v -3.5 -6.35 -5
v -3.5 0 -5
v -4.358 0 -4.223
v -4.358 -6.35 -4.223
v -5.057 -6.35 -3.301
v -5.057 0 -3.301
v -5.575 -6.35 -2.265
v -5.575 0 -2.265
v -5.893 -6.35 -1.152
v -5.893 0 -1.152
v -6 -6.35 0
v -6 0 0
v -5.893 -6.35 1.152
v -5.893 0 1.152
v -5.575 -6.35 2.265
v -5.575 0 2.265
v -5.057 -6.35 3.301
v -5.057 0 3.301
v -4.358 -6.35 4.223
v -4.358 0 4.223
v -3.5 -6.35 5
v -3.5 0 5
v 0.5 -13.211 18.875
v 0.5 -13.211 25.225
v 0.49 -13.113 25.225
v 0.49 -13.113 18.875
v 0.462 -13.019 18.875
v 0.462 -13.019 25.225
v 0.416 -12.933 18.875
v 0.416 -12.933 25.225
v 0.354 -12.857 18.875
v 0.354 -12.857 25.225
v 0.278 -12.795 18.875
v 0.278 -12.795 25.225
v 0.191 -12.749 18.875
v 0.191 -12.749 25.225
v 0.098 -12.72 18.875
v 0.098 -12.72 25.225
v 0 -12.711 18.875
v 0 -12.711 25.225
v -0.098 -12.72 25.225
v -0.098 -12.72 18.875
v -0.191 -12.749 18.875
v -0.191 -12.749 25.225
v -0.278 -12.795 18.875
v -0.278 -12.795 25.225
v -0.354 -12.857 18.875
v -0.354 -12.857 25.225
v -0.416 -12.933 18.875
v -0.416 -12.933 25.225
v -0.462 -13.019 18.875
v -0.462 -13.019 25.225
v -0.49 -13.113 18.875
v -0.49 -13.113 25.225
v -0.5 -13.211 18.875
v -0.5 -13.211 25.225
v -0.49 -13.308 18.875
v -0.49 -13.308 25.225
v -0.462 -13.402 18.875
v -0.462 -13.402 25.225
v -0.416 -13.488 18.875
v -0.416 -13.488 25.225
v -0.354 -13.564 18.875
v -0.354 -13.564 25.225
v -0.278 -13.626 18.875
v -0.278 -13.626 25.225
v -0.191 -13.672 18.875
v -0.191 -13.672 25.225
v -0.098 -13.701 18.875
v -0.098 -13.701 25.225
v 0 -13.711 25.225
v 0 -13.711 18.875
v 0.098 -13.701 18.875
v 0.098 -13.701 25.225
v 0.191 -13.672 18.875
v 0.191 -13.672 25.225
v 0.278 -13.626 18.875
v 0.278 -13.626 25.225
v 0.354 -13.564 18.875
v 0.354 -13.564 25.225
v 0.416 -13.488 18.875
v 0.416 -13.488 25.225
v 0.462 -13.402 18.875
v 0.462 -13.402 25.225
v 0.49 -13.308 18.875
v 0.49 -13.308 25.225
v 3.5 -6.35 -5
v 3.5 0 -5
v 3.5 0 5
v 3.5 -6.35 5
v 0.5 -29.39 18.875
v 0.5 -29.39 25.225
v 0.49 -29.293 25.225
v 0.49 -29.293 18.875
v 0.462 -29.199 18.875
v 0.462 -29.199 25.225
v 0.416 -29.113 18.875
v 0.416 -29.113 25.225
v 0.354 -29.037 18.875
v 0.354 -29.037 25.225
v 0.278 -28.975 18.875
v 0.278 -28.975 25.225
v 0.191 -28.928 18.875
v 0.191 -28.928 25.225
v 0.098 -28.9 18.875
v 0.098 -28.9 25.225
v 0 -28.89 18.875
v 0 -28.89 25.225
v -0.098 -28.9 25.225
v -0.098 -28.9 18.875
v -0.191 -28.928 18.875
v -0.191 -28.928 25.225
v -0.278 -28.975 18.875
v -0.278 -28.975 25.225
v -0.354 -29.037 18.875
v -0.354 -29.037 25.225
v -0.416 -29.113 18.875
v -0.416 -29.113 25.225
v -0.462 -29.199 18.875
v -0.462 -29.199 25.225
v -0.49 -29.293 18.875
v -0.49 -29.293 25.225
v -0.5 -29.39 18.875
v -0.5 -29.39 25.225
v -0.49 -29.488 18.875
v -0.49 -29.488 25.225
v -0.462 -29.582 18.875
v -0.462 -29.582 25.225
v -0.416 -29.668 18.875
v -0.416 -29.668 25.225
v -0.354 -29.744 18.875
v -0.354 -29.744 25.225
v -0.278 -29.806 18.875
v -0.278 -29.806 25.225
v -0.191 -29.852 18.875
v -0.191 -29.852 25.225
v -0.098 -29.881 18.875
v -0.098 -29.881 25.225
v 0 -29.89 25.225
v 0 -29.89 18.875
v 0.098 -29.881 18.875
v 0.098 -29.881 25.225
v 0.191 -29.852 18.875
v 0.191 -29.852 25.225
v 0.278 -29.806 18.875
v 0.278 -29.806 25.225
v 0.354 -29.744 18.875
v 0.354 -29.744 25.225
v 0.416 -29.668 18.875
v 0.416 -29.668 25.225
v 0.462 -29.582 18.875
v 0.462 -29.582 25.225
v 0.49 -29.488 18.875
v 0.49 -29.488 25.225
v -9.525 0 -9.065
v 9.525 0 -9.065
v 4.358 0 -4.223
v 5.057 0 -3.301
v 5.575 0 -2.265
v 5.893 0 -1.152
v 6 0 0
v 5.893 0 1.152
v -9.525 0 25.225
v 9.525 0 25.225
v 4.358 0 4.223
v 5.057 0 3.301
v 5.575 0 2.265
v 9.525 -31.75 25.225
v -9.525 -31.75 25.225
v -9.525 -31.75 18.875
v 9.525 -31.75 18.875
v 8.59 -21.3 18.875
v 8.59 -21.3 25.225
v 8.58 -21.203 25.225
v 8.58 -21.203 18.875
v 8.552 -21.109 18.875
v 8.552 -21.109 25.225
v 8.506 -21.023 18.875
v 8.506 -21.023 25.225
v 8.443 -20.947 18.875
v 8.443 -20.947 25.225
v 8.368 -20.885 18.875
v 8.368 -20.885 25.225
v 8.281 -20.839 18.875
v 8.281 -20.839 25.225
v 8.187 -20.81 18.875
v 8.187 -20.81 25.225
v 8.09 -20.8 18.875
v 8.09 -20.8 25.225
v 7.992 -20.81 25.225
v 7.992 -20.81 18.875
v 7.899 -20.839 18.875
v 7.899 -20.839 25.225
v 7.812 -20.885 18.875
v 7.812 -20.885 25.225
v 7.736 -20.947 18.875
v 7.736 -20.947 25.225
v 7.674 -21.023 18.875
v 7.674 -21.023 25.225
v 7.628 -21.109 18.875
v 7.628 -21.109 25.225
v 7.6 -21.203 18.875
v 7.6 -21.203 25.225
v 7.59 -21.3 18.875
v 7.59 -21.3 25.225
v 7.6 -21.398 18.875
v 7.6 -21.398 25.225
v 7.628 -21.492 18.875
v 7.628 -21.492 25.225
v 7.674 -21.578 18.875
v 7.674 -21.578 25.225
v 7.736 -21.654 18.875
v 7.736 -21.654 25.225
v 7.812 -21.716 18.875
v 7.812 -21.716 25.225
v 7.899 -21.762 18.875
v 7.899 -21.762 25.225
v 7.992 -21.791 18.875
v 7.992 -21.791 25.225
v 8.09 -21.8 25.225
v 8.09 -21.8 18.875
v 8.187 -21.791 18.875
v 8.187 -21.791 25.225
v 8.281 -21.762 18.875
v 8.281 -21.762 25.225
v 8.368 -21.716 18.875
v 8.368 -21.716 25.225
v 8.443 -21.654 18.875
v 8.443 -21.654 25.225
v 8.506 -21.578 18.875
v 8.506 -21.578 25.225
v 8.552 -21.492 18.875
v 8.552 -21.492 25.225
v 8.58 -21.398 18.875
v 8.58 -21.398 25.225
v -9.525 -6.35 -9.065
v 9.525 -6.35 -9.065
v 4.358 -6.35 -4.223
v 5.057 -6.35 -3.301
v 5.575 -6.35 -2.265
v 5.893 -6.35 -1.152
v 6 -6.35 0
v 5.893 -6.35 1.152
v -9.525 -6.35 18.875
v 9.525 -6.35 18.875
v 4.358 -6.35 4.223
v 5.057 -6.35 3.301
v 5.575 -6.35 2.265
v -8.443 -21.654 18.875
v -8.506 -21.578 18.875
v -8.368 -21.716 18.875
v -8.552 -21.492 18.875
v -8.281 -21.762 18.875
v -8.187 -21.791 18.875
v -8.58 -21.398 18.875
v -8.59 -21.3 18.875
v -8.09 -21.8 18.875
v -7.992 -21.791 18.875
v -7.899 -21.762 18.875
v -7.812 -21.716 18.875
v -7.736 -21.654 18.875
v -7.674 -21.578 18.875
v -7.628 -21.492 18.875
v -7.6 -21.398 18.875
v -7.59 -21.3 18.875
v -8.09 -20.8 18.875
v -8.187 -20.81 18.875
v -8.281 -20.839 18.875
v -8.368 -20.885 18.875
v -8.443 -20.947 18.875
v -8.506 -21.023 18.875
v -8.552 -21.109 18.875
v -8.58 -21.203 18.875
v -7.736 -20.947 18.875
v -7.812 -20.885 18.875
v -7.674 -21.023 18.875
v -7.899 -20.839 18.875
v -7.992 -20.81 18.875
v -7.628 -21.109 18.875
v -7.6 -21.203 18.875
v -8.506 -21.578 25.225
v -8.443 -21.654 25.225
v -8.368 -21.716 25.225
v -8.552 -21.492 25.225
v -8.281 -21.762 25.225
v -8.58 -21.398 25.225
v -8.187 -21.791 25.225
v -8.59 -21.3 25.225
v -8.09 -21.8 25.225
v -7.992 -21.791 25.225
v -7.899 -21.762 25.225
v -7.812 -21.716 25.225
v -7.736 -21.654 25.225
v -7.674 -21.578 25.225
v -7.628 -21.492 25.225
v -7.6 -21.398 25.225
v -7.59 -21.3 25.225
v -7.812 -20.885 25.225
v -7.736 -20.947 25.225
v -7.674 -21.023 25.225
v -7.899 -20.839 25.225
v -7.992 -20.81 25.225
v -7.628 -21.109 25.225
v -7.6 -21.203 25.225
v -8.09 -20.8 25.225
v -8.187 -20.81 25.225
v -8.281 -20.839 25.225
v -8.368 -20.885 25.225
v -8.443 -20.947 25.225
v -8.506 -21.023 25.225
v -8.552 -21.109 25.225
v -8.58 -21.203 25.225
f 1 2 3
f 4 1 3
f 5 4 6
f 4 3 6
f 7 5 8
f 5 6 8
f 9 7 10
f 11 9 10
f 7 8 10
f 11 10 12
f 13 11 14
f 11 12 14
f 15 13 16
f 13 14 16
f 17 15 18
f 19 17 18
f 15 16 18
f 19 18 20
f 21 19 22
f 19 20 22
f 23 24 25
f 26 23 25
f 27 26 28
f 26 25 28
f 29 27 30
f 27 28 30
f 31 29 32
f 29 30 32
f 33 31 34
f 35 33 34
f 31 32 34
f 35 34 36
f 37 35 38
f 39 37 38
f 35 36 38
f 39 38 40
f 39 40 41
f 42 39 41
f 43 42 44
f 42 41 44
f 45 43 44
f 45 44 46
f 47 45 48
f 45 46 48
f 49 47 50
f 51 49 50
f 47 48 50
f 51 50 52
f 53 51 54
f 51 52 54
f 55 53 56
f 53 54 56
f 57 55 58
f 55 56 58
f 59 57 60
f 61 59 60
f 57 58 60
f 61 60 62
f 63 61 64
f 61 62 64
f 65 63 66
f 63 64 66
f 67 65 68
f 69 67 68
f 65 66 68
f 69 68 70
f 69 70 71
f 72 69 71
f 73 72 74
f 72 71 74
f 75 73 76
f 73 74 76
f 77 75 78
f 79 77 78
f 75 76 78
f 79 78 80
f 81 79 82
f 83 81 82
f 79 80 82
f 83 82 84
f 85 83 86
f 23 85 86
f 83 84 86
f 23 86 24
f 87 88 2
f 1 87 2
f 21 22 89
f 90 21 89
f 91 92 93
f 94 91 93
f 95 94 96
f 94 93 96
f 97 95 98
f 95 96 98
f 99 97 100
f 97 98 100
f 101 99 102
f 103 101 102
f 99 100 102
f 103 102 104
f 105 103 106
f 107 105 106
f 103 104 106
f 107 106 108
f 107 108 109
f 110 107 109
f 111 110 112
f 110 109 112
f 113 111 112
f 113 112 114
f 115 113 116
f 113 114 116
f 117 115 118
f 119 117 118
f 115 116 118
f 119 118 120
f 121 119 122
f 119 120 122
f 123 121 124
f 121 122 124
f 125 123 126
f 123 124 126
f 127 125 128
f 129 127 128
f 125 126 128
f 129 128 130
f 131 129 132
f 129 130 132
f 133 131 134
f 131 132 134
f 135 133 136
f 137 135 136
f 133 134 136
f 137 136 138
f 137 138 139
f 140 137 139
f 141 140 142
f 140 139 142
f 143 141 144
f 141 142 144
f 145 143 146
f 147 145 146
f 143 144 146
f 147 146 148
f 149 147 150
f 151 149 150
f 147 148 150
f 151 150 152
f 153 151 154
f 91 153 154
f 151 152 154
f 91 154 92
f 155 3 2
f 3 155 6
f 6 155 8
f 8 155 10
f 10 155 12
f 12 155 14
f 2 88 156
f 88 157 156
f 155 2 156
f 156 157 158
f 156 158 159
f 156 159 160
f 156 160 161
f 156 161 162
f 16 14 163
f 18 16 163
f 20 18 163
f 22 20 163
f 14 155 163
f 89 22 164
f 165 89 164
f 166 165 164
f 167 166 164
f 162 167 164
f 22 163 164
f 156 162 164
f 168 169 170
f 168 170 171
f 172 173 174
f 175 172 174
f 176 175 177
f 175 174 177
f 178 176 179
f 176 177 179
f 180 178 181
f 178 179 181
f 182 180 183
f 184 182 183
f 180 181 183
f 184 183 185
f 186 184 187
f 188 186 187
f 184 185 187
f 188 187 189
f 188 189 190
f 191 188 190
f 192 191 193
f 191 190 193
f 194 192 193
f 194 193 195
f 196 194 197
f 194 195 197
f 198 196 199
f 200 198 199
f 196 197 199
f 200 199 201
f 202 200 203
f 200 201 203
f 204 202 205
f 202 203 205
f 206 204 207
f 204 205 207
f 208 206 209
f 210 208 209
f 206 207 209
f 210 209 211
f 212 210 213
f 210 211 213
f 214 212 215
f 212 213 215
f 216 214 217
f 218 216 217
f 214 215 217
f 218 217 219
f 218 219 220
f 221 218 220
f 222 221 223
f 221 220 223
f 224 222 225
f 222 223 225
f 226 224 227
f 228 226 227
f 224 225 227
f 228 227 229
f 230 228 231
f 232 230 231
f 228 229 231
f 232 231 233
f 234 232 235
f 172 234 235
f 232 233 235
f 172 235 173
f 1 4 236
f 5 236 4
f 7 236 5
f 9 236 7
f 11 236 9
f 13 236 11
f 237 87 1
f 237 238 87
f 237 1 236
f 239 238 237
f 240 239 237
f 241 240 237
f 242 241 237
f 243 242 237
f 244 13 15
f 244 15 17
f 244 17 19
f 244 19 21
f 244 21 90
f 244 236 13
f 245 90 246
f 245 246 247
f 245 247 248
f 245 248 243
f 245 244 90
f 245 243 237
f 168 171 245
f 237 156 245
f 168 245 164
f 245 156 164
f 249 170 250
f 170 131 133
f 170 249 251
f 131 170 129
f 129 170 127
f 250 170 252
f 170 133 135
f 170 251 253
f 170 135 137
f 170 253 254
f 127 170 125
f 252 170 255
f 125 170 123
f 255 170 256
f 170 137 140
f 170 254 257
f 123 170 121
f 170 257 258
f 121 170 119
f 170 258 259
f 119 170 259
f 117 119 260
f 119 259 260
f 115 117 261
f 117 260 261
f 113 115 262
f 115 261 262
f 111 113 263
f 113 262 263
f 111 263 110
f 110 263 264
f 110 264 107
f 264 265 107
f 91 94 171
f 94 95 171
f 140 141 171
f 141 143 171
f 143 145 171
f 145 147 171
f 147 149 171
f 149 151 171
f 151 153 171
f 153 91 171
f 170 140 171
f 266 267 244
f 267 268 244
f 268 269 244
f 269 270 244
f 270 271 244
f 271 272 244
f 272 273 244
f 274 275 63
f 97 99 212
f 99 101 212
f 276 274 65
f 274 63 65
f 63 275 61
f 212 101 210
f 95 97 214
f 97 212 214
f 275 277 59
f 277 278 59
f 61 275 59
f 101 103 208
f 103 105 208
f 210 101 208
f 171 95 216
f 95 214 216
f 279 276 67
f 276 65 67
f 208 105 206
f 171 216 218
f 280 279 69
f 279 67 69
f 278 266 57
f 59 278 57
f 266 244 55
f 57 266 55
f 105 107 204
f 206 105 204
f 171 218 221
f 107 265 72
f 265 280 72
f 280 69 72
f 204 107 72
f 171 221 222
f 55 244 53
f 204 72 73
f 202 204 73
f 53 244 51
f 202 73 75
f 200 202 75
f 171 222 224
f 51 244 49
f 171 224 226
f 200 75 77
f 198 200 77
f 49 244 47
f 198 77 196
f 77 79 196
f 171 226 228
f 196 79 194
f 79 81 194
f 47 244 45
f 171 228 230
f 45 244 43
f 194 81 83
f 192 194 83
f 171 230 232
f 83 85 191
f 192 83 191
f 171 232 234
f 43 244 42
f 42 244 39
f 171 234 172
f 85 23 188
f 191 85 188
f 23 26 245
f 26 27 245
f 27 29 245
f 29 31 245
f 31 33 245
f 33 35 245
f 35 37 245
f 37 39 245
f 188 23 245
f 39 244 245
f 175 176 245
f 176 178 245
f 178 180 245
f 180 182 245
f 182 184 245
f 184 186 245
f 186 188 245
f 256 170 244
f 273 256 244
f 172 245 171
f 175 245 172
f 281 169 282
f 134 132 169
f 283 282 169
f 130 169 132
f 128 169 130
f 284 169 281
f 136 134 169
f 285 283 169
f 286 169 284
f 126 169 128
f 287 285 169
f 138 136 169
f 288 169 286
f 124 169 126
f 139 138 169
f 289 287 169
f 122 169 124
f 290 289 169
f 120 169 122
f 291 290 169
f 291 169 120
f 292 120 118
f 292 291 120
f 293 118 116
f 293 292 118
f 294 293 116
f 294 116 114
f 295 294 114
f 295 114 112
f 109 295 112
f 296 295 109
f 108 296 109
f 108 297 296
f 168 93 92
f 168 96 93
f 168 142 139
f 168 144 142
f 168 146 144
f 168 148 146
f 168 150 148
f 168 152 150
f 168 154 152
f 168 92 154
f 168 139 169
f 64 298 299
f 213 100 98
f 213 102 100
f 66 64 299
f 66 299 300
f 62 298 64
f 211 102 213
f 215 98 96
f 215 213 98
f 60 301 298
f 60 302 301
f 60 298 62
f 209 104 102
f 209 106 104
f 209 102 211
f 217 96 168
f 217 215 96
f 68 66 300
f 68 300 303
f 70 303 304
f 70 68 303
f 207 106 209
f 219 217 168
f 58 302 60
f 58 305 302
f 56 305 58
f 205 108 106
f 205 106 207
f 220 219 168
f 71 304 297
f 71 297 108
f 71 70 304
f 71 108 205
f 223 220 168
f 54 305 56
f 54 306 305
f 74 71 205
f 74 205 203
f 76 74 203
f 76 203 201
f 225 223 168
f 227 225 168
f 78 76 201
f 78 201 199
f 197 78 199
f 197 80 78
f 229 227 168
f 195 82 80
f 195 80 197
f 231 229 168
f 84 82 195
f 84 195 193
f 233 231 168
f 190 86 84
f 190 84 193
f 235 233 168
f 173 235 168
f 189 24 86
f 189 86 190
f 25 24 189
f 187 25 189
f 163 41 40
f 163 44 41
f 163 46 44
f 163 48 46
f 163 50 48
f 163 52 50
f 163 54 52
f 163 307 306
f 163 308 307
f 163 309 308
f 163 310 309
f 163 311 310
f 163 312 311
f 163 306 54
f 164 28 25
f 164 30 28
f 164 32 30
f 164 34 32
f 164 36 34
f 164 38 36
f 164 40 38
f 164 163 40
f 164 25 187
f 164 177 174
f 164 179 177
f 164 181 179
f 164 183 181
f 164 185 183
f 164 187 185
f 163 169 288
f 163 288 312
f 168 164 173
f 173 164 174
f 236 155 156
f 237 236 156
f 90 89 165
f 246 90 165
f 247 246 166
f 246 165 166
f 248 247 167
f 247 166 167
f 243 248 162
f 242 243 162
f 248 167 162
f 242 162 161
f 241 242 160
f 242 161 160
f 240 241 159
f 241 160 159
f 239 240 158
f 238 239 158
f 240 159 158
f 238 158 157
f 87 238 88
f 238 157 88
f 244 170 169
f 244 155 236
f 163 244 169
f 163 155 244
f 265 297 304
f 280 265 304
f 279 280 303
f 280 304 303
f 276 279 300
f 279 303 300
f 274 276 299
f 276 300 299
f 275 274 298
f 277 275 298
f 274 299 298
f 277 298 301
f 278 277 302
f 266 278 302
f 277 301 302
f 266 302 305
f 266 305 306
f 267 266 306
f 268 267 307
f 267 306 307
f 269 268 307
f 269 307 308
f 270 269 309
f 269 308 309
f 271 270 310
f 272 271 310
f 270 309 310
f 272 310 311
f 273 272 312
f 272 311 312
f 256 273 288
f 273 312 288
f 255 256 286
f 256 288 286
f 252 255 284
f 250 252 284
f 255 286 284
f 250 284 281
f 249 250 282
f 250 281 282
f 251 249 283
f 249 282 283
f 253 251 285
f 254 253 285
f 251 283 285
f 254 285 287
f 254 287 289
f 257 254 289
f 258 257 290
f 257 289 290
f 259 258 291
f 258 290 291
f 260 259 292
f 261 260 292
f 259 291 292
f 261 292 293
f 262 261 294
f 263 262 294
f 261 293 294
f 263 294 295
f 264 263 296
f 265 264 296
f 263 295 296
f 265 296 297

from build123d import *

# Parameters (mm, degrees)
F0_W     = 19.05
F0_H     = 34.29
F1_DEPTH = 6.35
F2_W     = 19.05
F2_H     = 6.35
F3_DEPTH = 25.4
F4_R     = 0.5
F5_DEPTH = 6.35


with BuildPart() as f1:
    # F0 (on Front) → F1 (new body)
    with BuildSketch(Plane.XZ):
        with Locations((0, 8.08)):
            Rectangle(F0_W, F0_H)
        with BuildLine():
            ThreePointArc((-3.5, -5), (-6, 0), (-3.5, 5))
            Line((-3.5, 5), (3.5, 5))
            ThreePointArc((3.5, 5), (6, 0), (3.5, -5))
            Line((3.5, -5), (-3.5, -5))
        make_face(mode=Mode.SUBTRACT)
    extrude(amount=F1_DEPTH)

    # F2 (on face) → F3 (join)
    with BuildSketch(Plane.XZ.offset(6.35)):
        with Locations((0, 22.05)):
            Rectangle(F2_W, F2_H)
    extrude(amount=F3_DEPTH)

    # F4 (on face) → F5 (cut, through all)
    with BuildSketch(Plane.XY.offset(25.225)):
        with Locations((-8.0899, -21.30044)):
            Circle(F4_R)
        with Locations((0, -29.39034)):
            Circle(F4_R)
        with Locations((8.0899, -21.30044)):
            Circle(F4_R)
        with Locations((0, -13.21054)):
            Circle(F4_R)
    extrude(amount=-F5_DEPTH, mode=Mode.SUBTRACT)


solid = f1.part
